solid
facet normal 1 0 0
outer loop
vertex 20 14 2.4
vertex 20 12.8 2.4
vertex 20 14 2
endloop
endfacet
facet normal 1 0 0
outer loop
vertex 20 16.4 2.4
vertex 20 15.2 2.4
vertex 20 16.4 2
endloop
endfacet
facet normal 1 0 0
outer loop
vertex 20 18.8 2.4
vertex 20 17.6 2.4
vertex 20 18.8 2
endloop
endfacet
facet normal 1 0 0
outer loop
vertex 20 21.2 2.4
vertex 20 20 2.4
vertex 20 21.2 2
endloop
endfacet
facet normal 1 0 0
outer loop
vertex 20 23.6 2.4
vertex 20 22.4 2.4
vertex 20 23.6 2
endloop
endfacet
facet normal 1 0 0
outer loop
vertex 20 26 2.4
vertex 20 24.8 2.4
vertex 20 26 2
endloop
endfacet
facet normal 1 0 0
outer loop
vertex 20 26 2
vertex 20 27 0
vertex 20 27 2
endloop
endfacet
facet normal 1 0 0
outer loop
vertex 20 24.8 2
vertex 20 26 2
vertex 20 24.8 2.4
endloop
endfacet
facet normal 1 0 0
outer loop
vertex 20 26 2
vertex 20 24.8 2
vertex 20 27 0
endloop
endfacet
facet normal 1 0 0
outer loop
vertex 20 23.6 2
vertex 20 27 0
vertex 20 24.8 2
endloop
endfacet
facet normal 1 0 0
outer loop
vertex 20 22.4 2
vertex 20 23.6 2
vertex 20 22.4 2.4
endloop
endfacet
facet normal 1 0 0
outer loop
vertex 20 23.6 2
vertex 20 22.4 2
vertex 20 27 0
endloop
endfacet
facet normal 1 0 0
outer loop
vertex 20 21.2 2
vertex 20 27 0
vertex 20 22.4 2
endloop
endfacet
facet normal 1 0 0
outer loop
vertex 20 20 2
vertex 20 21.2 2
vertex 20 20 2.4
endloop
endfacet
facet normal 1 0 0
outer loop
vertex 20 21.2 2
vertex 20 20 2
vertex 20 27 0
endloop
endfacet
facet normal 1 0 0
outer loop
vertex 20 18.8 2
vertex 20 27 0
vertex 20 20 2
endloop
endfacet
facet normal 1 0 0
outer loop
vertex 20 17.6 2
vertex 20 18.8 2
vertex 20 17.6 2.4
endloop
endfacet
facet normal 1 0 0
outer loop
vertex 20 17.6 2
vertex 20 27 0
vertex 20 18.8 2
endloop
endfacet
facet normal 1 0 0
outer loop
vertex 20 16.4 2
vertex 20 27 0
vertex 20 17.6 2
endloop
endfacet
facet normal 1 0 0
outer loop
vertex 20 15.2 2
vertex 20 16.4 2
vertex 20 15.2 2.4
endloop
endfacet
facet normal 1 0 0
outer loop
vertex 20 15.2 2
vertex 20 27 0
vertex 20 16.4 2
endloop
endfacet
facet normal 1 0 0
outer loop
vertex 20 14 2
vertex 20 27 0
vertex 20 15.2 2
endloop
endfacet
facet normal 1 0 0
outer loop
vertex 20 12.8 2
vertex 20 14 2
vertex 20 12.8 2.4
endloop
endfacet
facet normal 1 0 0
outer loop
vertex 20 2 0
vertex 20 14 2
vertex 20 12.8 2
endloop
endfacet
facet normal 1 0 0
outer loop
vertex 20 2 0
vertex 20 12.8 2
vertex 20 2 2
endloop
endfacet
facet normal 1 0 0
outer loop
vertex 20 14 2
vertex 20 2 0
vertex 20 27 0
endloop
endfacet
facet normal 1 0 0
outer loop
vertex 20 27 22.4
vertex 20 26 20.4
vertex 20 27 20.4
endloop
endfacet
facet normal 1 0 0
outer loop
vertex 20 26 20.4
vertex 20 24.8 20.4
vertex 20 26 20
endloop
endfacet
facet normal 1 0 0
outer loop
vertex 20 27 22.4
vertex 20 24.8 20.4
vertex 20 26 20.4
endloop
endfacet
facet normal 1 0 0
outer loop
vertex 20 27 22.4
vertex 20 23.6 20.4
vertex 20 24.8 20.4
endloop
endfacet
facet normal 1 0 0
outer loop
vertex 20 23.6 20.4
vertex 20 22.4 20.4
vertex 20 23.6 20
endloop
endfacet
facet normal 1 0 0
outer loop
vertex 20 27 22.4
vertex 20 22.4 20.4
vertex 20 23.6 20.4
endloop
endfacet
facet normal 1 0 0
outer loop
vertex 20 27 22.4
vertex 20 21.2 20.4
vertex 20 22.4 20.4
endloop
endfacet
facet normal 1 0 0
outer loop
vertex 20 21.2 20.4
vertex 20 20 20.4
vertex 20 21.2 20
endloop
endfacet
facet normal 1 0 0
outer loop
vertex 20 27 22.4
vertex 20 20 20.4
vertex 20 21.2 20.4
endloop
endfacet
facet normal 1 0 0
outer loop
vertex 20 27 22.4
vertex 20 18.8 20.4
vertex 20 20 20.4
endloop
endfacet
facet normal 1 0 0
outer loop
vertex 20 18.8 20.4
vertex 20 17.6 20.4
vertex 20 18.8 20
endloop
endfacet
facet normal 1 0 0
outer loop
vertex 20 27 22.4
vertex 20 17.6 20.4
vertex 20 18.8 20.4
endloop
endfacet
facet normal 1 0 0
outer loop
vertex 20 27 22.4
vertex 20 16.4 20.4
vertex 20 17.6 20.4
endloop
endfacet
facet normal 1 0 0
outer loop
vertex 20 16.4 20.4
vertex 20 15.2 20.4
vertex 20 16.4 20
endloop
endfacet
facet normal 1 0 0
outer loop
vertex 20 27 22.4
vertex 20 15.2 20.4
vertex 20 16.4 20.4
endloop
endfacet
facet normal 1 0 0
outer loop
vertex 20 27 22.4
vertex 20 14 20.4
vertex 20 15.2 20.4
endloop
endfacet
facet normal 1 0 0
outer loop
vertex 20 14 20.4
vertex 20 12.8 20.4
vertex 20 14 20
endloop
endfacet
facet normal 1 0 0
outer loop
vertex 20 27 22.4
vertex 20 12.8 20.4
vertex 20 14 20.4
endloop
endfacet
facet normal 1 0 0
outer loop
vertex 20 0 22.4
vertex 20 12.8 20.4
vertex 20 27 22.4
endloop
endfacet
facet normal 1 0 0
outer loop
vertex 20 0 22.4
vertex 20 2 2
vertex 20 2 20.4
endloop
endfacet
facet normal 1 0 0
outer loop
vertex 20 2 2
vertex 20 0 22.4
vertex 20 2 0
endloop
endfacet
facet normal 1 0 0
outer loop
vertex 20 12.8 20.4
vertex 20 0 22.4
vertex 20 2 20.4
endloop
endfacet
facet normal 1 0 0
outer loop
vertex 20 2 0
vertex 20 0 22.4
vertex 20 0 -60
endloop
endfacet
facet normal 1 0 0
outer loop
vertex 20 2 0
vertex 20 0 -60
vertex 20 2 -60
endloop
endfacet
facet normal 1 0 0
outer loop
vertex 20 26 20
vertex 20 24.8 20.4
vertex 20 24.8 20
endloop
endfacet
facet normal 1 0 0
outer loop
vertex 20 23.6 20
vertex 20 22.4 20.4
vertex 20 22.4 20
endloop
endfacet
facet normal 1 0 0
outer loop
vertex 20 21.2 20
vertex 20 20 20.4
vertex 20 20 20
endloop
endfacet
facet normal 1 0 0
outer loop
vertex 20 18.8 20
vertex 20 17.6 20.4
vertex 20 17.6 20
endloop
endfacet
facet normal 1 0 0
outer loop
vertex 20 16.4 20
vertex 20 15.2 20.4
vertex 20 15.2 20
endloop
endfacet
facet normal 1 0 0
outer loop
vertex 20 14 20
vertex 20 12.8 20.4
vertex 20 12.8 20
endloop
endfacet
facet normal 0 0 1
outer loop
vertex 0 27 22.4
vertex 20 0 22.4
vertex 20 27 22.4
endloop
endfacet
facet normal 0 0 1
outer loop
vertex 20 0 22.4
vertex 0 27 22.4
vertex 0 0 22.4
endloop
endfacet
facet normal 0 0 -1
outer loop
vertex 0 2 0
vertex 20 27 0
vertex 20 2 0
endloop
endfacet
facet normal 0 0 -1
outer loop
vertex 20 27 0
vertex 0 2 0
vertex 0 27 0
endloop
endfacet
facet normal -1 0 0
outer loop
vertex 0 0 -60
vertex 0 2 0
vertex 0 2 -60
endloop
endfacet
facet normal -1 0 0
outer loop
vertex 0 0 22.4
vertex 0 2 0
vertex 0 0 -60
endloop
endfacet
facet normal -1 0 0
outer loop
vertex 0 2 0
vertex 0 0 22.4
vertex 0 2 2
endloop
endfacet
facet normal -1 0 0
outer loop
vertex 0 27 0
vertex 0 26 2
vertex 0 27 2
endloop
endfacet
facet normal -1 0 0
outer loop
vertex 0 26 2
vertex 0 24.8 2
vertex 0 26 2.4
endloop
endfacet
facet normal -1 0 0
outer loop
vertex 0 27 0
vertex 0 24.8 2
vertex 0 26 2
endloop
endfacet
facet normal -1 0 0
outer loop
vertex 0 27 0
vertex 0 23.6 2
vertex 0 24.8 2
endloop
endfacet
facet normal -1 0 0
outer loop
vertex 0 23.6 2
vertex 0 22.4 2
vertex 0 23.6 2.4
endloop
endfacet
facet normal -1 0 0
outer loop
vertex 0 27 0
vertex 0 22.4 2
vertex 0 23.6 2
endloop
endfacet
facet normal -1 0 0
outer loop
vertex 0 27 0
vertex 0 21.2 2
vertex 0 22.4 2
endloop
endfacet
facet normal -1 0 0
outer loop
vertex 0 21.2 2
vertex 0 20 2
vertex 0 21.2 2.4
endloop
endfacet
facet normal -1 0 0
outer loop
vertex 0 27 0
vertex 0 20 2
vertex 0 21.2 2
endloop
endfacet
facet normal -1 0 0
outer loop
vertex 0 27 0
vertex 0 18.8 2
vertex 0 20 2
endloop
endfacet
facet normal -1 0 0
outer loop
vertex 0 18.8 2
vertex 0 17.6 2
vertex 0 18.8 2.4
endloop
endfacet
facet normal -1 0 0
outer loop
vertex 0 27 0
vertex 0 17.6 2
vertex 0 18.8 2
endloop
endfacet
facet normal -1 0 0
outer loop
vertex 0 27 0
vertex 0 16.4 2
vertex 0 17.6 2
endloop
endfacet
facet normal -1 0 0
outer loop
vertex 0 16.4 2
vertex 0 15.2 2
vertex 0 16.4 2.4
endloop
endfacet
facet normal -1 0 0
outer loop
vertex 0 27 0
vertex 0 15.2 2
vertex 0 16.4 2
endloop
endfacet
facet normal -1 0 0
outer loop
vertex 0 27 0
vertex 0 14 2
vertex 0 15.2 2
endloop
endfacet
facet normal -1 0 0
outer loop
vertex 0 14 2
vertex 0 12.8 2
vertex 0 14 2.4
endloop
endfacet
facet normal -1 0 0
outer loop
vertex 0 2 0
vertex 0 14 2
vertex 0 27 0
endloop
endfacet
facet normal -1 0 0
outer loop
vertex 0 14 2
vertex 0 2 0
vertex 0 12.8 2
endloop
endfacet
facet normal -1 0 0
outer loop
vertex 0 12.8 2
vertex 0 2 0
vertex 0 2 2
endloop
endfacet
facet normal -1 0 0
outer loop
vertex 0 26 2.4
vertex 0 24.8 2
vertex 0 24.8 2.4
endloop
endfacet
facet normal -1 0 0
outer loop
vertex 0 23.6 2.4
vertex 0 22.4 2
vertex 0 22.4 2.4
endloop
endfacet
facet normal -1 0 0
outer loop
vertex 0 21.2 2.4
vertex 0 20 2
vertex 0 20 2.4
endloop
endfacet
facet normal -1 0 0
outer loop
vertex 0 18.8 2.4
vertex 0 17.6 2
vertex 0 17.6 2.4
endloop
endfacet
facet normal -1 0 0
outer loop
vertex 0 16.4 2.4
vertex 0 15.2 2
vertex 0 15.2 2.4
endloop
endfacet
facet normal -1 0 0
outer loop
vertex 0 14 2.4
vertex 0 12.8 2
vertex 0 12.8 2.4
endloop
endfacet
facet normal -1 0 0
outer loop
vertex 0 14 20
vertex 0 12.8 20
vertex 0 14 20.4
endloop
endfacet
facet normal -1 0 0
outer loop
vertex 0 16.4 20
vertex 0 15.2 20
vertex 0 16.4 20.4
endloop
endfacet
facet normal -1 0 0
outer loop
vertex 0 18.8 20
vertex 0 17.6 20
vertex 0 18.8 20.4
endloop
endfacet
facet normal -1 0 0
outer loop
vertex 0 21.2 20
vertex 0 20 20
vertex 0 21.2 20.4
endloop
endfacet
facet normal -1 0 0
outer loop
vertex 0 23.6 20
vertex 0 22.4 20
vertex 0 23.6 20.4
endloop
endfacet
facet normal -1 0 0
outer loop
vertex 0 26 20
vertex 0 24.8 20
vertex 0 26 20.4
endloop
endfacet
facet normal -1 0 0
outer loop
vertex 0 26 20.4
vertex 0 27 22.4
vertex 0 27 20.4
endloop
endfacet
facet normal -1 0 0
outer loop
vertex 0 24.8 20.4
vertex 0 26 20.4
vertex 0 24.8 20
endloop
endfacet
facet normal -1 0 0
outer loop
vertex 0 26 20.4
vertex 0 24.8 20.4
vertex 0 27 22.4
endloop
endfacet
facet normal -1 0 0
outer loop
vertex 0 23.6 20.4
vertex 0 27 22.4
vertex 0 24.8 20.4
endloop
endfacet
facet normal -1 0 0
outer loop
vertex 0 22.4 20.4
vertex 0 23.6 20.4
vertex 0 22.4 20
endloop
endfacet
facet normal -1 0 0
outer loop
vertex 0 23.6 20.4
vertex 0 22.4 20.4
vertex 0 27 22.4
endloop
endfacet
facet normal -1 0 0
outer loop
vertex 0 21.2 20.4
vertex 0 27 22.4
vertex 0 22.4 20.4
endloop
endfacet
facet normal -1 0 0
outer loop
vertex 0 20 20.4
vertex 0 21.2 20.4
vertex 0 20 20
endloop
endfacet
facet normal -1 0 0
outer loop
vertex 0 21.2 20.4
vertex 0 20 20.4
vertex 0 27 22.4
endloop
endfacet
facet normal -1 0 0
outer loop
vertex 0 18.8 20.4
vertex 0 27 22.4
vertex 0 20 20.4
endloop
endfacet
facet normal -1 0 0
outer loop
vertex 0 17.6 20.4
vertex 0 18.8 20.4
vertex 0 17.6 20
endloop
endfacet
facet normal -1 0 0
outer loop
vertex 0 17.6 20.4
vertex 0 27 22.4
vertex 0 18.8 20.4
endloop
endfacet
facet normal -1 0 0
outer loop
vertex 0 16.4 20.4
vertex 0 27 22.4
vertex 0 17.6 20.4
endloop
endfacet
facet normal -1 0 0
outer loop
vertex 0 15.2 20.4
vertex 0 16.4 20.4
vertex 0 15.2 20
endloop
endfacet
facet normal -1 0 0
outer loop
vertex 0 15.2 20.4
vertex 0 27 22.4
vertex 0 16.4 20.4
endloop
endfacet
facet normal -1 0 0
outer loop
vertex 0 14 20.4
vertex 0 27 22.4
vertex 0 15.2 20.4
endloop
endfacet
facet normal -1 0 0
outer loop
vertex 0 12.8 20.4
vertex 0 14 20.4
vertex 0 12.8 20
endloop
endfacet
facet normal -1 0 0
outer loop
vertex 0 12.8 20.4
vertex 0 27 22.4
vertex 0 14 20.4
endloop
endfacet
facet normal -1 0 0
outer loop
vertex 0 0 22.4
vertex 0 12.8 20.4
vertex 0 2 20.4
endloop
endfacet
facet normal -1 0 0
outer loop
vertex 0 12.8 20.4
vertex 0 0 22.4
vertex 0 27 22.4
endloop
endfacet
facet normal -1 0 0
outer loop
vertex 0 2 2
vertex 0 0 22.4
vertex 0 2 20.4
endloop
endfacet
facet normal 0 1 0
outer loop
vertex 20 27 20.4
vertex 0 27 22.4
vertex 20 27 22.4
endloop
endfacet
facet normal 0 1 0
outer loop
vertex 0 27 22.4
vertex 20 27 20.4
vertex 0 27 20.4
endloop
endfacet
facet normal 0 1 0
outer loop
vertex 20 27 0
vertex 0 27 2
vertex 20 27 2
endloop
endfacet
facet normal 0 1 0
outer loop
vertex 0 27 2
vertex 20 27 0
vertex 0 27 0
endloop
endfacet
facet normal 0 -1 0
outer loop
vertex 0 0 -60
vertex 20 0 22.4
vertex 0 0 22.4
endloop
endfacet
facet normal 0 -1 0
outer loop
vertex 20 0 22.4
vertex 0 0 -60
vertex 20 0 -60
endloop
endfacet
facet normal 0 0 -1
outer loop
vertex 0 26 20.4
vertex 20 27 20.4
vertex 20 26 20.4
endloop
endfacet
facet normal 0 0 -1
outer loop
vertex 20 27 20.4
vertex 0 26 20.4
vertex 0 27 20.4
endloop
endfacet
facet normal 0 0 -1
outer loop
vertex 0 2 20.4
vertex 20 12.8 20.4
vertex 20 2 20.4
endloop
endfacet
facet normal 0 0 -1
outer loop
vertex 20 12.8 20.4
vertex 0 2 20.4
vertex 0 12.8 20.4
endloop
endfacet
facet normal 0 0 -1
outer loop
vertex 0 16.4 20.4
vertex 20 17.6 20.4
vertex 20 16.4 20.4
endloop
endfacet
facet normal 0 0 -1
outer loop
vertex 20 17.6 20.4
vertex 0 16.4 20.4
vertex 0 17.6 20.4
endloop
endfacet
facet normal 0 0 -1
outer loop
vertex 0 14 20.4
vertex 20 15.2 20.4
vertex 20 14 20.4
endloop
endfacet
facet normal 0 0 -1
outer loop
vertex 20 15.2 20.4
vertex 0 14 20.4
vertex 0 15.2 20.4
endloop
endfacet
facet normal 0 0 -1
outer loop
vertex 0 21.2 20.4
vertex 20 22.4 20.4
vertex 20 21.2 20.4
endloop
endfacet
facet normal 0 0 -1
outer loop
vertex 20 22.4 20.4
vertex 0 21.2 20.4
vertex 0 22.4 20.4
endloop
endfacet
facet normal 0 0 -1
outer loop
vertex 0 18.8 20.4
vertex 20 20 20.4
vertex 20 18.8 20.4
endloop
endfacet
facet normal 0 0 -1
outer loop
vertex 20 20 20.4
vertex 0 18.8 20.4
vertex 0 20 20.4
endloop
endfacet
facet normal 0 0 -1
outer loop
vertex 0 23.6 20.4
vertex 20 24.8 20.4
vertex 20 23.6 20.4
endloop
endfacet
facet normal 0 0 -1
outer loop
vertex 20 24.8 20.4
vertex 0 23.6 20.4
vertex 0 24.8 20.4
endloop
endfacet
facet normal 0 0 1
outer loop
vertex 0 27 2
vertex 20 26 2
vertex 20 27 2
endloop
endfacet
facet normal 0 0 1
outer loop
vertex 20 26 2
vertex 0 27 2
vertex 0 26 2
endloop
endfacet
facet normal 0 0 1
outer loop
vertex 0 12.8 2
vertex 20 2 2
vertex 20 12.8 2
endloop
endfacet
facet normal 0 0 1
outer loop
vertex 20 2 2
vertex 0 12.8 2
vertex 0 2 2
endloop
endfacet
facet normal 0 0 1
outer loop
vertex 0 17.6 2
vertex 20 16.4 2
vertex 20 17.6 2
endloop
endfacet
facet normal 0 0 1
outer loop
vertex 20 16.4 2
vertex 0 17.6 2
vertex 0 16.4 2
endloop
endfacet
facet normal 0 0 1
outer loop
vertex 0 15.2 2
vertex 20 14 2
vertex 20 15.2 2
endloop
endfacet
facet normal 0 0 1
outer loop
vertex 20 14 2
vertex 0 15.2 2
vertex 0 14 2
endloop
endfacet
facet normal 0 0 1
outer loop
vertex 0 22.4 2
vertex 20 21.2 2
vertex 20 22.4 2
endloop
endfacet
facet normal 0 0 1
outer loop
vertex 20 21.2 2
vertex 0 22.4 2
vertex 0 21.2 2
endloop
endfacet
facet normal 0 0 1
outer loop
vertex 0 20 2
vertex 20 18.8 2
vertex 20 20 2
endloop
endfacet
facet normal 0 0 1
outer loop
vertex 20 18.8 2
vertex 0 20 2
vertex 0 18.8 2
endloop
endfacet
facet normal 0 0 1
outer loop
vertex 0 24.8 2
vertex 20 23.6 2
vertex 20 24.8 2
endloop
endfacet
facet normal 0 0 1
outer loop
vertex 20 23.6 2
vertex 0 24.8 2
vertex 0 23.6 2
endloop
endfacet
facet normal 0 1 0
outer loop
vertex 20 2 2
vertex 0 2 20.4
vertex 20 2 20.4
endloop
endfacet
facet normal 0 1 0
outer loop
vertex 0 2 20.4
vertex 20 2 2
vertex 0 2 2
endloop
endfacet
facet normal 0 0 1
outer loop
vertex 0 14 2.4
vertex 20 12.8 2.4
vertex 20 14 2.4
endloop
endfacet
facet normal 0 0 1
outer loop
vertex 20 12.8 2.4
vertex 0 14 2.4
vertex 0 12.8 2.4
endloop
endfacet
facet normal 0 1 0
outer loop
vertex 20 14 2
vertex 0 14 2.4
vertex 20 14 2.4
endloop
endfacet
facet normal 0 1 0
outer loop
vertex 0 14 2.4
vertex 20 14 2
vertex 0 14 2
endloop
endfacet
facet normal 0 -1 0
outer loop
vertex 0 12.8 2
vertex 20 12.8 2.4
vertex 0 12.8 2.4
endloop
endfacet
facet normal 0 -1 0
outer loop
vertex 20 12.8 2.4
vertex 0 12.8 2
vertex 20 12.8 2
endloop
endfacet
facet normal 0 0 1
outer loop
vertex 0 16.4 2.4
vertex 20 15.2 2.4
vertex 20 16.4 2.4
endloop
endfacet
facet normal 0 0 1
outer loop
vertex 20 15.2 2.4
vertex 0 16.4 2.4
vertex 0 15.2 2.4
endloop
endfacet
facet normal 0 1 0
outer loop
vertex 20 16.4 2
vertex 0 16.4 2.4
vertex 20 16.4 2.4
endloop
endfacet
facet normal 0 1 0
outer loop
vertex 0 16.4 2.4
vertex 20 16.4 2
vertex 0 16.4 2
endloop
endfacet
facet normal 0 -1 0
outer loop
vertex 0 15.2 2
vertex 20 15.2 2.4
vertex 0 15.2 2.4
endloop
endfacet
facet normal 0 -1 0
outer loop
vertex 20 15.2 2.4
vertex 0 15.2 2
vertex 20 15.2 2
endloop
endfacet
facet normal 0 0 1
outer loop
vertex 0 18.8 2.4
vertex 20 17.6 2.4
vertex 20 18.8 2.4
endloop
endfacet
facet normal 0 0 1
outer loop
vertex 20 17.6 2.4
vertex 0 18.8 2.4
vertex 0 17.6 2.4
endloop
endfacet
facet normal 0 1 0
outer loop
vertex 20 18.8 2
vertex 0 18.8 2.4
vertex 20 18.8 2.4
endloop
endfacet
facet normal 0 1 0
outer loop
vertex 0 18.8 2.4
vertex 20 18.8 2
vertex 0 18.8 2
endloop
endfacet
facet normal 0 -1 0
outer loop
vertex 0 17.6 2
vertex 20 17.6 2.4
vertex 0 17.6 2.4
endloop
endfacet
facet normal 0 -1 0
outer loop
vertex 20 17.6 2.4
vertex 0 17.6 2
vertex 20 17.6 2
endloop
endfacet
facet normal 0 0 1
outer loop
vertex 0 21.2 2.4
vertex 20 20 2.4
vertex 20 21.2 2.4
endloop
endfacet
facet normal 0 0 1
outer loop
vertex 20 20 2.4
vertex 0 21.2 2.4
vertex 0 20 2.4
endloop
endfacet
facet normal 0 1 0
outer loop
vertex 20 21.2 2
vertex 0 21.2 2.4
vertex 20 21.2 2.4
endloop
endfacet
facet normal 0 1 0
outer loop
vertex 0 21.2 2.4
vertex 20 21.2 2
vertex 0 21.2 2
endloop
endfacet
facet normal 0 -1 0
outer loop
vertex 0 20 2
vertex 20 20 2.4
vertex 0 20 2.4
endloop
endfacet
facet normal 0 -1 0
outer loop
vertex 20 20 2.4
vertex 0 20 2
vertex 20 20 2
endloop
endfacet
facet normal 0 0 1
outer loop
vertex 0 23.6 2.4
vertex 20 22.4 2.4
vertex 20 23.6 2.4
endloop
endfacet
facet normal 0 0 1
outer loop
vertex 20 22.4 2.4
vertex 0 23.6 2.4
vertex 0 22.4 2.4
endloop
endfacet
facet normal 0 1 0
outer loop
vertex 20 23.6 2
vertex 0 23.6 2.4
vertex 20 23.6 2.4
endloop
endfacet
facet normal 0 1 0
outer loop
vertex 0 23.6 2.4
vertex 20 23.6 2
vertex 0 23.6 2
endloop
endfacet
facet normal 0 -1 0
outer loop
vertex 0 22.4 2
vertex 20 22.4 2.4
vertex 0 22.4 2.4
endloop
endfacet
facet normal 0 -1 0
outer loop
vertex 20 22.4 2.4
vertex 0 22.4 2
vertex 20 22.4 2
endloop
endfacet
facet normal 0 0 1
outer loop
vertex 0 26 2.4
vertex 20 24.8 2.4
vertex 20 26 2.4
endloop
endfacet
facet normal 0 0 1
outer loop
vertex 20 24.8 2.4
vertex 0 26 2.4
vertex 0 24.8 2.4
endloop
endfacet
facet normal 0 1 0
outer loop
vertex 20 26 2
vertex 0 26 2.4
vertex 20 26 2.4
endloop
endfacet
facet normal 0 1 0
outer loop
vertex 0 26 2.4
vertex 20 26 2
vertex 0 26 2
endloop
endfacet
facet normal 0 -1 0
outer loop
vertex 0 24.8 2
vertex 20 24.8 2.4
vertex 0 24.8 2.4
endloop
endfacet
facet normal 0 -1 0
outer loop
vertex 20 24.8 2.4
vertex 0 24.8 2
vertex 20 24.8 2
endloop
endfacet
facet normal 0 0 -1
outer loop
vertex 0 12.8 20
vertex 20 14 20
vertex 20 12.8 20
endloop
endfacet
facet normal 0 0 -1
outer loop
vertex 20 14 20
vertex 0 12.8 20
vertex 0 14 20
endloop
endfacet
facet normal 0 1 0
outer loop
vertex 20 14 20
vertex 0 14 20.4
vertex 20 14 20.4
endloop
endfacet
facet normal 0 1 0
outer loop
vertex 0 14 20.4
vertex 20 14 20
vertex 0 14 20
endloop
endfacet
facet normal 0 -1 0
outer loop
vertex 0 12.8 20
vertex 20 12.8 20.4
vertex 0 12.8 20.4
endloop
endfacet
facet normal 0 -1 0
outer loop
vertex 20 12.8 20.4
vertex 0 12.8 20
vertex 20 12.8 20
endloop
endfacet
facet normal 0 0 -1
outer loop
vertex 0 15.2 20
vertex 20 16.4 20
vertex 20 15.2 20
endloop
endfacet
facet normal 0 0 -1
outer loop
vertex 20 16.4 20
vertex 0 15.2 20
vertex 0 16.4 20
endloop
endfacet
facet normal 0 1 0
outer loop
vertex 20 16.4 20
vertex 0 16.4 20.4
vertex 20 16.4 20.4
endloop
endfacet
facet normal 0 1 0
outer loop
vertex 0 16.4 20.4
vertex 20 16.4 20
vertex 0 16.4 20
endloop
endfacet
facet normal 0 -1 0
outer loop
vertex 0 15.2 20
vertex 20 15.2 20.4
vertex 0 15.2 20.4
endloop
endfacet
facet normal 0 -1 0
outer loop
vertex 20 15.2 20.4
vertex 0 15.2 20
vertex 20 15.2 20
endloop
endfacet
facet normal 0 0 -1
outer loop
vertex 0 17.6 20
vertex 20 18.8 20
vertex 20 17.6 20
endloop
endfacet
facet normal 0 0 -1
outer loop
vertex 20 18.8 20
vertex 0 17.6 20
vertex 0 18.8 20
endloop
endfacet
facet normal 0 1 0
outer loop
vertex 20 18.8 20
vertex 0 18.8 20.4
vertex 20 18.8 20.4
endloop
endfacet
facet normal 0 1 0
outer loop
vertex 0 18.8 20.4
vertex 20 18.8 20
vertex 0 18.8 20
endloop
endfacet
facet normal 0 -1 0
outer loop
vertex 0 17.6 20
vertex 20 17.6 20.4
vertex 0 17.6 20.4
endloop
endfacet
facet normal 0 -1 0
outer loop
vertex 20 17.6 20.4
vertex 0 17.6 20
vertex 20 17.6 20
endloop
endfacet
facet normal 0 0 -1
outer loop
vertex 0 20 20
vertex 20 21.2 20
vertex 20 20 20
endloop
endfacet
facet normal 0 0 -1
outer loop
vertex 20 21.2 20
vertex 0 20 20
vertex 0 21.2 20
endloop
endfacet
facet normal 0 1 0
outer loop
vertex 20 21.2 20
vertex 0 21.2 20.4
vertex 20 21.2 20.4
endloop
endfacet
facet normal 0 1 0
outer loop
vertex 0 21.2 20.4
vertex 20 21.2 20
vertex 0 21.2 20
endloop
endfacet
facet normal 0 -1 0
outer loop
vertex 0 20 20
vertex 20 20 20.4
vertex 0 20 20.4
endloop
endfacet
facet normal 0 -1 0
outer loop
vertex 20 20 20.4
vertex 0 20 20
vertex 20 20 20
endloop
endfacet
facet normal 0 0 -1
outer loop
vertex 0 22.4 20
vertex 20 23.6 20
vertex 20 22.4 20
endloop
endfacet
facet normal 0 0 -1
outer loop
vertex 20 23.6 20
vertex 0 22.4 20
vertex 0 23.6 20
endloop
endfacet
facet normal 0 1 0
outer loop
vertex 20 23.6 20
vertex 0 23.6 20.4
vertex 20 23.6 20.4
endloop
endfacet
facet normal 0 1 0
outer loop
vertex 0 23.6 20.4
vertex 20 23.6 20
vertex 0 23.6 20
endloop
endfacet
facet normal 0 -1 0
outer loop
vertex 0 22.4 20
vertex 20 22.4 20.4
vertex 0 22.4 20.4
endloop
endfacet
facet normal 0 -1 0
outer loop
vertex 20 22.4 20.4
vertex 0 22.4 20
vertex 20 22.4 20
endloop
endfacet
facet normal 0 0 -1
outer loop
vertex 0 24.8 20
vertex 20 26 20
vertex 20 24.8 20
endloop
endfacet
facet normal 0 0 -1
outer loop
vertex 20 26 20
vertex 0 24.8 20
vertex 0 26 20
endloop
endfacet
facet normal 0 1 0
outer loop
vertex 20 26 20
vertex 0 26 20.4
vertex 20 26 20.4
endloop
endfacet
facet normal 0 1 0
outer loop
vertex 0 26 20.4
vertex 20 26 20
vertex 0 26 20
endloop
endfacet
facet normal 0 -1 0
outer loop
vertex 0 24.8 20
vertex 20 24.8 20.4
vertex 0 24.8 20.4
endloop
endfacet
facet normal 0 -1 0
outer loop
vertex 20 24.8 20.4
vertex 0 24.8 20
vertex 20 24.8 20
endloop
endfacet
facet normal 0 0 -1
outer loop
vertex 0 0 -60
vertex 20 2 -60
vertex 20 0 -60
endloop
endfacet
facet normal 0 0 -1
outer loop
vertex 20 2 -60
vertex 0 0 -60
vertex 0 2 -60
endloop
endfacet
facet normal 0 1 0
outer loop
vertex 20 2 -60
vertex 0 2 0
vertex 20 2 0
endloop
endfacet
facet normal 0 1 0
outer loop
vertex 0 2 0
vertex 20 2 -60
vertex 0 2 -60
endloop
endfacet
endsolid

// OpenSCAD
width = 20;
thickness = 2;
shelf_height = 18;
ridge_height = 0.4;
clip_height = shelf_height + ridge_height;
clip_depth = 25;
ridge_depth = 1.2;
hangdown = 60;
skip_ridges = 4;


union() {
  difference() {
    cube([width, clip_depth + thickness, clip_height + 2*thickness]);
    translate([0,thickness,thickness]) cube([width, clip_depth, clip_height]);
  }
  translate([0,0,-hangdown]) cube([width, thickness, hangdown]);

  for(y = [thickness+ridge_depth + 2*skip_ridges*ridge_depth: 2*ridge_depth : clip_depth ]) {
    translate([0,y,thickness]) cube([width, ridge_depth, ridge_height]);
  }
  for(y = [thickness+ridge_depth + 2*skip_ridges*ridge_depth: 2*ridge_depth : clip_depth ]) {
    translate([0,y,clip_height + thickness - ridge_height]) cube([width, ridge_depth, ridge_height]);
  }
}
